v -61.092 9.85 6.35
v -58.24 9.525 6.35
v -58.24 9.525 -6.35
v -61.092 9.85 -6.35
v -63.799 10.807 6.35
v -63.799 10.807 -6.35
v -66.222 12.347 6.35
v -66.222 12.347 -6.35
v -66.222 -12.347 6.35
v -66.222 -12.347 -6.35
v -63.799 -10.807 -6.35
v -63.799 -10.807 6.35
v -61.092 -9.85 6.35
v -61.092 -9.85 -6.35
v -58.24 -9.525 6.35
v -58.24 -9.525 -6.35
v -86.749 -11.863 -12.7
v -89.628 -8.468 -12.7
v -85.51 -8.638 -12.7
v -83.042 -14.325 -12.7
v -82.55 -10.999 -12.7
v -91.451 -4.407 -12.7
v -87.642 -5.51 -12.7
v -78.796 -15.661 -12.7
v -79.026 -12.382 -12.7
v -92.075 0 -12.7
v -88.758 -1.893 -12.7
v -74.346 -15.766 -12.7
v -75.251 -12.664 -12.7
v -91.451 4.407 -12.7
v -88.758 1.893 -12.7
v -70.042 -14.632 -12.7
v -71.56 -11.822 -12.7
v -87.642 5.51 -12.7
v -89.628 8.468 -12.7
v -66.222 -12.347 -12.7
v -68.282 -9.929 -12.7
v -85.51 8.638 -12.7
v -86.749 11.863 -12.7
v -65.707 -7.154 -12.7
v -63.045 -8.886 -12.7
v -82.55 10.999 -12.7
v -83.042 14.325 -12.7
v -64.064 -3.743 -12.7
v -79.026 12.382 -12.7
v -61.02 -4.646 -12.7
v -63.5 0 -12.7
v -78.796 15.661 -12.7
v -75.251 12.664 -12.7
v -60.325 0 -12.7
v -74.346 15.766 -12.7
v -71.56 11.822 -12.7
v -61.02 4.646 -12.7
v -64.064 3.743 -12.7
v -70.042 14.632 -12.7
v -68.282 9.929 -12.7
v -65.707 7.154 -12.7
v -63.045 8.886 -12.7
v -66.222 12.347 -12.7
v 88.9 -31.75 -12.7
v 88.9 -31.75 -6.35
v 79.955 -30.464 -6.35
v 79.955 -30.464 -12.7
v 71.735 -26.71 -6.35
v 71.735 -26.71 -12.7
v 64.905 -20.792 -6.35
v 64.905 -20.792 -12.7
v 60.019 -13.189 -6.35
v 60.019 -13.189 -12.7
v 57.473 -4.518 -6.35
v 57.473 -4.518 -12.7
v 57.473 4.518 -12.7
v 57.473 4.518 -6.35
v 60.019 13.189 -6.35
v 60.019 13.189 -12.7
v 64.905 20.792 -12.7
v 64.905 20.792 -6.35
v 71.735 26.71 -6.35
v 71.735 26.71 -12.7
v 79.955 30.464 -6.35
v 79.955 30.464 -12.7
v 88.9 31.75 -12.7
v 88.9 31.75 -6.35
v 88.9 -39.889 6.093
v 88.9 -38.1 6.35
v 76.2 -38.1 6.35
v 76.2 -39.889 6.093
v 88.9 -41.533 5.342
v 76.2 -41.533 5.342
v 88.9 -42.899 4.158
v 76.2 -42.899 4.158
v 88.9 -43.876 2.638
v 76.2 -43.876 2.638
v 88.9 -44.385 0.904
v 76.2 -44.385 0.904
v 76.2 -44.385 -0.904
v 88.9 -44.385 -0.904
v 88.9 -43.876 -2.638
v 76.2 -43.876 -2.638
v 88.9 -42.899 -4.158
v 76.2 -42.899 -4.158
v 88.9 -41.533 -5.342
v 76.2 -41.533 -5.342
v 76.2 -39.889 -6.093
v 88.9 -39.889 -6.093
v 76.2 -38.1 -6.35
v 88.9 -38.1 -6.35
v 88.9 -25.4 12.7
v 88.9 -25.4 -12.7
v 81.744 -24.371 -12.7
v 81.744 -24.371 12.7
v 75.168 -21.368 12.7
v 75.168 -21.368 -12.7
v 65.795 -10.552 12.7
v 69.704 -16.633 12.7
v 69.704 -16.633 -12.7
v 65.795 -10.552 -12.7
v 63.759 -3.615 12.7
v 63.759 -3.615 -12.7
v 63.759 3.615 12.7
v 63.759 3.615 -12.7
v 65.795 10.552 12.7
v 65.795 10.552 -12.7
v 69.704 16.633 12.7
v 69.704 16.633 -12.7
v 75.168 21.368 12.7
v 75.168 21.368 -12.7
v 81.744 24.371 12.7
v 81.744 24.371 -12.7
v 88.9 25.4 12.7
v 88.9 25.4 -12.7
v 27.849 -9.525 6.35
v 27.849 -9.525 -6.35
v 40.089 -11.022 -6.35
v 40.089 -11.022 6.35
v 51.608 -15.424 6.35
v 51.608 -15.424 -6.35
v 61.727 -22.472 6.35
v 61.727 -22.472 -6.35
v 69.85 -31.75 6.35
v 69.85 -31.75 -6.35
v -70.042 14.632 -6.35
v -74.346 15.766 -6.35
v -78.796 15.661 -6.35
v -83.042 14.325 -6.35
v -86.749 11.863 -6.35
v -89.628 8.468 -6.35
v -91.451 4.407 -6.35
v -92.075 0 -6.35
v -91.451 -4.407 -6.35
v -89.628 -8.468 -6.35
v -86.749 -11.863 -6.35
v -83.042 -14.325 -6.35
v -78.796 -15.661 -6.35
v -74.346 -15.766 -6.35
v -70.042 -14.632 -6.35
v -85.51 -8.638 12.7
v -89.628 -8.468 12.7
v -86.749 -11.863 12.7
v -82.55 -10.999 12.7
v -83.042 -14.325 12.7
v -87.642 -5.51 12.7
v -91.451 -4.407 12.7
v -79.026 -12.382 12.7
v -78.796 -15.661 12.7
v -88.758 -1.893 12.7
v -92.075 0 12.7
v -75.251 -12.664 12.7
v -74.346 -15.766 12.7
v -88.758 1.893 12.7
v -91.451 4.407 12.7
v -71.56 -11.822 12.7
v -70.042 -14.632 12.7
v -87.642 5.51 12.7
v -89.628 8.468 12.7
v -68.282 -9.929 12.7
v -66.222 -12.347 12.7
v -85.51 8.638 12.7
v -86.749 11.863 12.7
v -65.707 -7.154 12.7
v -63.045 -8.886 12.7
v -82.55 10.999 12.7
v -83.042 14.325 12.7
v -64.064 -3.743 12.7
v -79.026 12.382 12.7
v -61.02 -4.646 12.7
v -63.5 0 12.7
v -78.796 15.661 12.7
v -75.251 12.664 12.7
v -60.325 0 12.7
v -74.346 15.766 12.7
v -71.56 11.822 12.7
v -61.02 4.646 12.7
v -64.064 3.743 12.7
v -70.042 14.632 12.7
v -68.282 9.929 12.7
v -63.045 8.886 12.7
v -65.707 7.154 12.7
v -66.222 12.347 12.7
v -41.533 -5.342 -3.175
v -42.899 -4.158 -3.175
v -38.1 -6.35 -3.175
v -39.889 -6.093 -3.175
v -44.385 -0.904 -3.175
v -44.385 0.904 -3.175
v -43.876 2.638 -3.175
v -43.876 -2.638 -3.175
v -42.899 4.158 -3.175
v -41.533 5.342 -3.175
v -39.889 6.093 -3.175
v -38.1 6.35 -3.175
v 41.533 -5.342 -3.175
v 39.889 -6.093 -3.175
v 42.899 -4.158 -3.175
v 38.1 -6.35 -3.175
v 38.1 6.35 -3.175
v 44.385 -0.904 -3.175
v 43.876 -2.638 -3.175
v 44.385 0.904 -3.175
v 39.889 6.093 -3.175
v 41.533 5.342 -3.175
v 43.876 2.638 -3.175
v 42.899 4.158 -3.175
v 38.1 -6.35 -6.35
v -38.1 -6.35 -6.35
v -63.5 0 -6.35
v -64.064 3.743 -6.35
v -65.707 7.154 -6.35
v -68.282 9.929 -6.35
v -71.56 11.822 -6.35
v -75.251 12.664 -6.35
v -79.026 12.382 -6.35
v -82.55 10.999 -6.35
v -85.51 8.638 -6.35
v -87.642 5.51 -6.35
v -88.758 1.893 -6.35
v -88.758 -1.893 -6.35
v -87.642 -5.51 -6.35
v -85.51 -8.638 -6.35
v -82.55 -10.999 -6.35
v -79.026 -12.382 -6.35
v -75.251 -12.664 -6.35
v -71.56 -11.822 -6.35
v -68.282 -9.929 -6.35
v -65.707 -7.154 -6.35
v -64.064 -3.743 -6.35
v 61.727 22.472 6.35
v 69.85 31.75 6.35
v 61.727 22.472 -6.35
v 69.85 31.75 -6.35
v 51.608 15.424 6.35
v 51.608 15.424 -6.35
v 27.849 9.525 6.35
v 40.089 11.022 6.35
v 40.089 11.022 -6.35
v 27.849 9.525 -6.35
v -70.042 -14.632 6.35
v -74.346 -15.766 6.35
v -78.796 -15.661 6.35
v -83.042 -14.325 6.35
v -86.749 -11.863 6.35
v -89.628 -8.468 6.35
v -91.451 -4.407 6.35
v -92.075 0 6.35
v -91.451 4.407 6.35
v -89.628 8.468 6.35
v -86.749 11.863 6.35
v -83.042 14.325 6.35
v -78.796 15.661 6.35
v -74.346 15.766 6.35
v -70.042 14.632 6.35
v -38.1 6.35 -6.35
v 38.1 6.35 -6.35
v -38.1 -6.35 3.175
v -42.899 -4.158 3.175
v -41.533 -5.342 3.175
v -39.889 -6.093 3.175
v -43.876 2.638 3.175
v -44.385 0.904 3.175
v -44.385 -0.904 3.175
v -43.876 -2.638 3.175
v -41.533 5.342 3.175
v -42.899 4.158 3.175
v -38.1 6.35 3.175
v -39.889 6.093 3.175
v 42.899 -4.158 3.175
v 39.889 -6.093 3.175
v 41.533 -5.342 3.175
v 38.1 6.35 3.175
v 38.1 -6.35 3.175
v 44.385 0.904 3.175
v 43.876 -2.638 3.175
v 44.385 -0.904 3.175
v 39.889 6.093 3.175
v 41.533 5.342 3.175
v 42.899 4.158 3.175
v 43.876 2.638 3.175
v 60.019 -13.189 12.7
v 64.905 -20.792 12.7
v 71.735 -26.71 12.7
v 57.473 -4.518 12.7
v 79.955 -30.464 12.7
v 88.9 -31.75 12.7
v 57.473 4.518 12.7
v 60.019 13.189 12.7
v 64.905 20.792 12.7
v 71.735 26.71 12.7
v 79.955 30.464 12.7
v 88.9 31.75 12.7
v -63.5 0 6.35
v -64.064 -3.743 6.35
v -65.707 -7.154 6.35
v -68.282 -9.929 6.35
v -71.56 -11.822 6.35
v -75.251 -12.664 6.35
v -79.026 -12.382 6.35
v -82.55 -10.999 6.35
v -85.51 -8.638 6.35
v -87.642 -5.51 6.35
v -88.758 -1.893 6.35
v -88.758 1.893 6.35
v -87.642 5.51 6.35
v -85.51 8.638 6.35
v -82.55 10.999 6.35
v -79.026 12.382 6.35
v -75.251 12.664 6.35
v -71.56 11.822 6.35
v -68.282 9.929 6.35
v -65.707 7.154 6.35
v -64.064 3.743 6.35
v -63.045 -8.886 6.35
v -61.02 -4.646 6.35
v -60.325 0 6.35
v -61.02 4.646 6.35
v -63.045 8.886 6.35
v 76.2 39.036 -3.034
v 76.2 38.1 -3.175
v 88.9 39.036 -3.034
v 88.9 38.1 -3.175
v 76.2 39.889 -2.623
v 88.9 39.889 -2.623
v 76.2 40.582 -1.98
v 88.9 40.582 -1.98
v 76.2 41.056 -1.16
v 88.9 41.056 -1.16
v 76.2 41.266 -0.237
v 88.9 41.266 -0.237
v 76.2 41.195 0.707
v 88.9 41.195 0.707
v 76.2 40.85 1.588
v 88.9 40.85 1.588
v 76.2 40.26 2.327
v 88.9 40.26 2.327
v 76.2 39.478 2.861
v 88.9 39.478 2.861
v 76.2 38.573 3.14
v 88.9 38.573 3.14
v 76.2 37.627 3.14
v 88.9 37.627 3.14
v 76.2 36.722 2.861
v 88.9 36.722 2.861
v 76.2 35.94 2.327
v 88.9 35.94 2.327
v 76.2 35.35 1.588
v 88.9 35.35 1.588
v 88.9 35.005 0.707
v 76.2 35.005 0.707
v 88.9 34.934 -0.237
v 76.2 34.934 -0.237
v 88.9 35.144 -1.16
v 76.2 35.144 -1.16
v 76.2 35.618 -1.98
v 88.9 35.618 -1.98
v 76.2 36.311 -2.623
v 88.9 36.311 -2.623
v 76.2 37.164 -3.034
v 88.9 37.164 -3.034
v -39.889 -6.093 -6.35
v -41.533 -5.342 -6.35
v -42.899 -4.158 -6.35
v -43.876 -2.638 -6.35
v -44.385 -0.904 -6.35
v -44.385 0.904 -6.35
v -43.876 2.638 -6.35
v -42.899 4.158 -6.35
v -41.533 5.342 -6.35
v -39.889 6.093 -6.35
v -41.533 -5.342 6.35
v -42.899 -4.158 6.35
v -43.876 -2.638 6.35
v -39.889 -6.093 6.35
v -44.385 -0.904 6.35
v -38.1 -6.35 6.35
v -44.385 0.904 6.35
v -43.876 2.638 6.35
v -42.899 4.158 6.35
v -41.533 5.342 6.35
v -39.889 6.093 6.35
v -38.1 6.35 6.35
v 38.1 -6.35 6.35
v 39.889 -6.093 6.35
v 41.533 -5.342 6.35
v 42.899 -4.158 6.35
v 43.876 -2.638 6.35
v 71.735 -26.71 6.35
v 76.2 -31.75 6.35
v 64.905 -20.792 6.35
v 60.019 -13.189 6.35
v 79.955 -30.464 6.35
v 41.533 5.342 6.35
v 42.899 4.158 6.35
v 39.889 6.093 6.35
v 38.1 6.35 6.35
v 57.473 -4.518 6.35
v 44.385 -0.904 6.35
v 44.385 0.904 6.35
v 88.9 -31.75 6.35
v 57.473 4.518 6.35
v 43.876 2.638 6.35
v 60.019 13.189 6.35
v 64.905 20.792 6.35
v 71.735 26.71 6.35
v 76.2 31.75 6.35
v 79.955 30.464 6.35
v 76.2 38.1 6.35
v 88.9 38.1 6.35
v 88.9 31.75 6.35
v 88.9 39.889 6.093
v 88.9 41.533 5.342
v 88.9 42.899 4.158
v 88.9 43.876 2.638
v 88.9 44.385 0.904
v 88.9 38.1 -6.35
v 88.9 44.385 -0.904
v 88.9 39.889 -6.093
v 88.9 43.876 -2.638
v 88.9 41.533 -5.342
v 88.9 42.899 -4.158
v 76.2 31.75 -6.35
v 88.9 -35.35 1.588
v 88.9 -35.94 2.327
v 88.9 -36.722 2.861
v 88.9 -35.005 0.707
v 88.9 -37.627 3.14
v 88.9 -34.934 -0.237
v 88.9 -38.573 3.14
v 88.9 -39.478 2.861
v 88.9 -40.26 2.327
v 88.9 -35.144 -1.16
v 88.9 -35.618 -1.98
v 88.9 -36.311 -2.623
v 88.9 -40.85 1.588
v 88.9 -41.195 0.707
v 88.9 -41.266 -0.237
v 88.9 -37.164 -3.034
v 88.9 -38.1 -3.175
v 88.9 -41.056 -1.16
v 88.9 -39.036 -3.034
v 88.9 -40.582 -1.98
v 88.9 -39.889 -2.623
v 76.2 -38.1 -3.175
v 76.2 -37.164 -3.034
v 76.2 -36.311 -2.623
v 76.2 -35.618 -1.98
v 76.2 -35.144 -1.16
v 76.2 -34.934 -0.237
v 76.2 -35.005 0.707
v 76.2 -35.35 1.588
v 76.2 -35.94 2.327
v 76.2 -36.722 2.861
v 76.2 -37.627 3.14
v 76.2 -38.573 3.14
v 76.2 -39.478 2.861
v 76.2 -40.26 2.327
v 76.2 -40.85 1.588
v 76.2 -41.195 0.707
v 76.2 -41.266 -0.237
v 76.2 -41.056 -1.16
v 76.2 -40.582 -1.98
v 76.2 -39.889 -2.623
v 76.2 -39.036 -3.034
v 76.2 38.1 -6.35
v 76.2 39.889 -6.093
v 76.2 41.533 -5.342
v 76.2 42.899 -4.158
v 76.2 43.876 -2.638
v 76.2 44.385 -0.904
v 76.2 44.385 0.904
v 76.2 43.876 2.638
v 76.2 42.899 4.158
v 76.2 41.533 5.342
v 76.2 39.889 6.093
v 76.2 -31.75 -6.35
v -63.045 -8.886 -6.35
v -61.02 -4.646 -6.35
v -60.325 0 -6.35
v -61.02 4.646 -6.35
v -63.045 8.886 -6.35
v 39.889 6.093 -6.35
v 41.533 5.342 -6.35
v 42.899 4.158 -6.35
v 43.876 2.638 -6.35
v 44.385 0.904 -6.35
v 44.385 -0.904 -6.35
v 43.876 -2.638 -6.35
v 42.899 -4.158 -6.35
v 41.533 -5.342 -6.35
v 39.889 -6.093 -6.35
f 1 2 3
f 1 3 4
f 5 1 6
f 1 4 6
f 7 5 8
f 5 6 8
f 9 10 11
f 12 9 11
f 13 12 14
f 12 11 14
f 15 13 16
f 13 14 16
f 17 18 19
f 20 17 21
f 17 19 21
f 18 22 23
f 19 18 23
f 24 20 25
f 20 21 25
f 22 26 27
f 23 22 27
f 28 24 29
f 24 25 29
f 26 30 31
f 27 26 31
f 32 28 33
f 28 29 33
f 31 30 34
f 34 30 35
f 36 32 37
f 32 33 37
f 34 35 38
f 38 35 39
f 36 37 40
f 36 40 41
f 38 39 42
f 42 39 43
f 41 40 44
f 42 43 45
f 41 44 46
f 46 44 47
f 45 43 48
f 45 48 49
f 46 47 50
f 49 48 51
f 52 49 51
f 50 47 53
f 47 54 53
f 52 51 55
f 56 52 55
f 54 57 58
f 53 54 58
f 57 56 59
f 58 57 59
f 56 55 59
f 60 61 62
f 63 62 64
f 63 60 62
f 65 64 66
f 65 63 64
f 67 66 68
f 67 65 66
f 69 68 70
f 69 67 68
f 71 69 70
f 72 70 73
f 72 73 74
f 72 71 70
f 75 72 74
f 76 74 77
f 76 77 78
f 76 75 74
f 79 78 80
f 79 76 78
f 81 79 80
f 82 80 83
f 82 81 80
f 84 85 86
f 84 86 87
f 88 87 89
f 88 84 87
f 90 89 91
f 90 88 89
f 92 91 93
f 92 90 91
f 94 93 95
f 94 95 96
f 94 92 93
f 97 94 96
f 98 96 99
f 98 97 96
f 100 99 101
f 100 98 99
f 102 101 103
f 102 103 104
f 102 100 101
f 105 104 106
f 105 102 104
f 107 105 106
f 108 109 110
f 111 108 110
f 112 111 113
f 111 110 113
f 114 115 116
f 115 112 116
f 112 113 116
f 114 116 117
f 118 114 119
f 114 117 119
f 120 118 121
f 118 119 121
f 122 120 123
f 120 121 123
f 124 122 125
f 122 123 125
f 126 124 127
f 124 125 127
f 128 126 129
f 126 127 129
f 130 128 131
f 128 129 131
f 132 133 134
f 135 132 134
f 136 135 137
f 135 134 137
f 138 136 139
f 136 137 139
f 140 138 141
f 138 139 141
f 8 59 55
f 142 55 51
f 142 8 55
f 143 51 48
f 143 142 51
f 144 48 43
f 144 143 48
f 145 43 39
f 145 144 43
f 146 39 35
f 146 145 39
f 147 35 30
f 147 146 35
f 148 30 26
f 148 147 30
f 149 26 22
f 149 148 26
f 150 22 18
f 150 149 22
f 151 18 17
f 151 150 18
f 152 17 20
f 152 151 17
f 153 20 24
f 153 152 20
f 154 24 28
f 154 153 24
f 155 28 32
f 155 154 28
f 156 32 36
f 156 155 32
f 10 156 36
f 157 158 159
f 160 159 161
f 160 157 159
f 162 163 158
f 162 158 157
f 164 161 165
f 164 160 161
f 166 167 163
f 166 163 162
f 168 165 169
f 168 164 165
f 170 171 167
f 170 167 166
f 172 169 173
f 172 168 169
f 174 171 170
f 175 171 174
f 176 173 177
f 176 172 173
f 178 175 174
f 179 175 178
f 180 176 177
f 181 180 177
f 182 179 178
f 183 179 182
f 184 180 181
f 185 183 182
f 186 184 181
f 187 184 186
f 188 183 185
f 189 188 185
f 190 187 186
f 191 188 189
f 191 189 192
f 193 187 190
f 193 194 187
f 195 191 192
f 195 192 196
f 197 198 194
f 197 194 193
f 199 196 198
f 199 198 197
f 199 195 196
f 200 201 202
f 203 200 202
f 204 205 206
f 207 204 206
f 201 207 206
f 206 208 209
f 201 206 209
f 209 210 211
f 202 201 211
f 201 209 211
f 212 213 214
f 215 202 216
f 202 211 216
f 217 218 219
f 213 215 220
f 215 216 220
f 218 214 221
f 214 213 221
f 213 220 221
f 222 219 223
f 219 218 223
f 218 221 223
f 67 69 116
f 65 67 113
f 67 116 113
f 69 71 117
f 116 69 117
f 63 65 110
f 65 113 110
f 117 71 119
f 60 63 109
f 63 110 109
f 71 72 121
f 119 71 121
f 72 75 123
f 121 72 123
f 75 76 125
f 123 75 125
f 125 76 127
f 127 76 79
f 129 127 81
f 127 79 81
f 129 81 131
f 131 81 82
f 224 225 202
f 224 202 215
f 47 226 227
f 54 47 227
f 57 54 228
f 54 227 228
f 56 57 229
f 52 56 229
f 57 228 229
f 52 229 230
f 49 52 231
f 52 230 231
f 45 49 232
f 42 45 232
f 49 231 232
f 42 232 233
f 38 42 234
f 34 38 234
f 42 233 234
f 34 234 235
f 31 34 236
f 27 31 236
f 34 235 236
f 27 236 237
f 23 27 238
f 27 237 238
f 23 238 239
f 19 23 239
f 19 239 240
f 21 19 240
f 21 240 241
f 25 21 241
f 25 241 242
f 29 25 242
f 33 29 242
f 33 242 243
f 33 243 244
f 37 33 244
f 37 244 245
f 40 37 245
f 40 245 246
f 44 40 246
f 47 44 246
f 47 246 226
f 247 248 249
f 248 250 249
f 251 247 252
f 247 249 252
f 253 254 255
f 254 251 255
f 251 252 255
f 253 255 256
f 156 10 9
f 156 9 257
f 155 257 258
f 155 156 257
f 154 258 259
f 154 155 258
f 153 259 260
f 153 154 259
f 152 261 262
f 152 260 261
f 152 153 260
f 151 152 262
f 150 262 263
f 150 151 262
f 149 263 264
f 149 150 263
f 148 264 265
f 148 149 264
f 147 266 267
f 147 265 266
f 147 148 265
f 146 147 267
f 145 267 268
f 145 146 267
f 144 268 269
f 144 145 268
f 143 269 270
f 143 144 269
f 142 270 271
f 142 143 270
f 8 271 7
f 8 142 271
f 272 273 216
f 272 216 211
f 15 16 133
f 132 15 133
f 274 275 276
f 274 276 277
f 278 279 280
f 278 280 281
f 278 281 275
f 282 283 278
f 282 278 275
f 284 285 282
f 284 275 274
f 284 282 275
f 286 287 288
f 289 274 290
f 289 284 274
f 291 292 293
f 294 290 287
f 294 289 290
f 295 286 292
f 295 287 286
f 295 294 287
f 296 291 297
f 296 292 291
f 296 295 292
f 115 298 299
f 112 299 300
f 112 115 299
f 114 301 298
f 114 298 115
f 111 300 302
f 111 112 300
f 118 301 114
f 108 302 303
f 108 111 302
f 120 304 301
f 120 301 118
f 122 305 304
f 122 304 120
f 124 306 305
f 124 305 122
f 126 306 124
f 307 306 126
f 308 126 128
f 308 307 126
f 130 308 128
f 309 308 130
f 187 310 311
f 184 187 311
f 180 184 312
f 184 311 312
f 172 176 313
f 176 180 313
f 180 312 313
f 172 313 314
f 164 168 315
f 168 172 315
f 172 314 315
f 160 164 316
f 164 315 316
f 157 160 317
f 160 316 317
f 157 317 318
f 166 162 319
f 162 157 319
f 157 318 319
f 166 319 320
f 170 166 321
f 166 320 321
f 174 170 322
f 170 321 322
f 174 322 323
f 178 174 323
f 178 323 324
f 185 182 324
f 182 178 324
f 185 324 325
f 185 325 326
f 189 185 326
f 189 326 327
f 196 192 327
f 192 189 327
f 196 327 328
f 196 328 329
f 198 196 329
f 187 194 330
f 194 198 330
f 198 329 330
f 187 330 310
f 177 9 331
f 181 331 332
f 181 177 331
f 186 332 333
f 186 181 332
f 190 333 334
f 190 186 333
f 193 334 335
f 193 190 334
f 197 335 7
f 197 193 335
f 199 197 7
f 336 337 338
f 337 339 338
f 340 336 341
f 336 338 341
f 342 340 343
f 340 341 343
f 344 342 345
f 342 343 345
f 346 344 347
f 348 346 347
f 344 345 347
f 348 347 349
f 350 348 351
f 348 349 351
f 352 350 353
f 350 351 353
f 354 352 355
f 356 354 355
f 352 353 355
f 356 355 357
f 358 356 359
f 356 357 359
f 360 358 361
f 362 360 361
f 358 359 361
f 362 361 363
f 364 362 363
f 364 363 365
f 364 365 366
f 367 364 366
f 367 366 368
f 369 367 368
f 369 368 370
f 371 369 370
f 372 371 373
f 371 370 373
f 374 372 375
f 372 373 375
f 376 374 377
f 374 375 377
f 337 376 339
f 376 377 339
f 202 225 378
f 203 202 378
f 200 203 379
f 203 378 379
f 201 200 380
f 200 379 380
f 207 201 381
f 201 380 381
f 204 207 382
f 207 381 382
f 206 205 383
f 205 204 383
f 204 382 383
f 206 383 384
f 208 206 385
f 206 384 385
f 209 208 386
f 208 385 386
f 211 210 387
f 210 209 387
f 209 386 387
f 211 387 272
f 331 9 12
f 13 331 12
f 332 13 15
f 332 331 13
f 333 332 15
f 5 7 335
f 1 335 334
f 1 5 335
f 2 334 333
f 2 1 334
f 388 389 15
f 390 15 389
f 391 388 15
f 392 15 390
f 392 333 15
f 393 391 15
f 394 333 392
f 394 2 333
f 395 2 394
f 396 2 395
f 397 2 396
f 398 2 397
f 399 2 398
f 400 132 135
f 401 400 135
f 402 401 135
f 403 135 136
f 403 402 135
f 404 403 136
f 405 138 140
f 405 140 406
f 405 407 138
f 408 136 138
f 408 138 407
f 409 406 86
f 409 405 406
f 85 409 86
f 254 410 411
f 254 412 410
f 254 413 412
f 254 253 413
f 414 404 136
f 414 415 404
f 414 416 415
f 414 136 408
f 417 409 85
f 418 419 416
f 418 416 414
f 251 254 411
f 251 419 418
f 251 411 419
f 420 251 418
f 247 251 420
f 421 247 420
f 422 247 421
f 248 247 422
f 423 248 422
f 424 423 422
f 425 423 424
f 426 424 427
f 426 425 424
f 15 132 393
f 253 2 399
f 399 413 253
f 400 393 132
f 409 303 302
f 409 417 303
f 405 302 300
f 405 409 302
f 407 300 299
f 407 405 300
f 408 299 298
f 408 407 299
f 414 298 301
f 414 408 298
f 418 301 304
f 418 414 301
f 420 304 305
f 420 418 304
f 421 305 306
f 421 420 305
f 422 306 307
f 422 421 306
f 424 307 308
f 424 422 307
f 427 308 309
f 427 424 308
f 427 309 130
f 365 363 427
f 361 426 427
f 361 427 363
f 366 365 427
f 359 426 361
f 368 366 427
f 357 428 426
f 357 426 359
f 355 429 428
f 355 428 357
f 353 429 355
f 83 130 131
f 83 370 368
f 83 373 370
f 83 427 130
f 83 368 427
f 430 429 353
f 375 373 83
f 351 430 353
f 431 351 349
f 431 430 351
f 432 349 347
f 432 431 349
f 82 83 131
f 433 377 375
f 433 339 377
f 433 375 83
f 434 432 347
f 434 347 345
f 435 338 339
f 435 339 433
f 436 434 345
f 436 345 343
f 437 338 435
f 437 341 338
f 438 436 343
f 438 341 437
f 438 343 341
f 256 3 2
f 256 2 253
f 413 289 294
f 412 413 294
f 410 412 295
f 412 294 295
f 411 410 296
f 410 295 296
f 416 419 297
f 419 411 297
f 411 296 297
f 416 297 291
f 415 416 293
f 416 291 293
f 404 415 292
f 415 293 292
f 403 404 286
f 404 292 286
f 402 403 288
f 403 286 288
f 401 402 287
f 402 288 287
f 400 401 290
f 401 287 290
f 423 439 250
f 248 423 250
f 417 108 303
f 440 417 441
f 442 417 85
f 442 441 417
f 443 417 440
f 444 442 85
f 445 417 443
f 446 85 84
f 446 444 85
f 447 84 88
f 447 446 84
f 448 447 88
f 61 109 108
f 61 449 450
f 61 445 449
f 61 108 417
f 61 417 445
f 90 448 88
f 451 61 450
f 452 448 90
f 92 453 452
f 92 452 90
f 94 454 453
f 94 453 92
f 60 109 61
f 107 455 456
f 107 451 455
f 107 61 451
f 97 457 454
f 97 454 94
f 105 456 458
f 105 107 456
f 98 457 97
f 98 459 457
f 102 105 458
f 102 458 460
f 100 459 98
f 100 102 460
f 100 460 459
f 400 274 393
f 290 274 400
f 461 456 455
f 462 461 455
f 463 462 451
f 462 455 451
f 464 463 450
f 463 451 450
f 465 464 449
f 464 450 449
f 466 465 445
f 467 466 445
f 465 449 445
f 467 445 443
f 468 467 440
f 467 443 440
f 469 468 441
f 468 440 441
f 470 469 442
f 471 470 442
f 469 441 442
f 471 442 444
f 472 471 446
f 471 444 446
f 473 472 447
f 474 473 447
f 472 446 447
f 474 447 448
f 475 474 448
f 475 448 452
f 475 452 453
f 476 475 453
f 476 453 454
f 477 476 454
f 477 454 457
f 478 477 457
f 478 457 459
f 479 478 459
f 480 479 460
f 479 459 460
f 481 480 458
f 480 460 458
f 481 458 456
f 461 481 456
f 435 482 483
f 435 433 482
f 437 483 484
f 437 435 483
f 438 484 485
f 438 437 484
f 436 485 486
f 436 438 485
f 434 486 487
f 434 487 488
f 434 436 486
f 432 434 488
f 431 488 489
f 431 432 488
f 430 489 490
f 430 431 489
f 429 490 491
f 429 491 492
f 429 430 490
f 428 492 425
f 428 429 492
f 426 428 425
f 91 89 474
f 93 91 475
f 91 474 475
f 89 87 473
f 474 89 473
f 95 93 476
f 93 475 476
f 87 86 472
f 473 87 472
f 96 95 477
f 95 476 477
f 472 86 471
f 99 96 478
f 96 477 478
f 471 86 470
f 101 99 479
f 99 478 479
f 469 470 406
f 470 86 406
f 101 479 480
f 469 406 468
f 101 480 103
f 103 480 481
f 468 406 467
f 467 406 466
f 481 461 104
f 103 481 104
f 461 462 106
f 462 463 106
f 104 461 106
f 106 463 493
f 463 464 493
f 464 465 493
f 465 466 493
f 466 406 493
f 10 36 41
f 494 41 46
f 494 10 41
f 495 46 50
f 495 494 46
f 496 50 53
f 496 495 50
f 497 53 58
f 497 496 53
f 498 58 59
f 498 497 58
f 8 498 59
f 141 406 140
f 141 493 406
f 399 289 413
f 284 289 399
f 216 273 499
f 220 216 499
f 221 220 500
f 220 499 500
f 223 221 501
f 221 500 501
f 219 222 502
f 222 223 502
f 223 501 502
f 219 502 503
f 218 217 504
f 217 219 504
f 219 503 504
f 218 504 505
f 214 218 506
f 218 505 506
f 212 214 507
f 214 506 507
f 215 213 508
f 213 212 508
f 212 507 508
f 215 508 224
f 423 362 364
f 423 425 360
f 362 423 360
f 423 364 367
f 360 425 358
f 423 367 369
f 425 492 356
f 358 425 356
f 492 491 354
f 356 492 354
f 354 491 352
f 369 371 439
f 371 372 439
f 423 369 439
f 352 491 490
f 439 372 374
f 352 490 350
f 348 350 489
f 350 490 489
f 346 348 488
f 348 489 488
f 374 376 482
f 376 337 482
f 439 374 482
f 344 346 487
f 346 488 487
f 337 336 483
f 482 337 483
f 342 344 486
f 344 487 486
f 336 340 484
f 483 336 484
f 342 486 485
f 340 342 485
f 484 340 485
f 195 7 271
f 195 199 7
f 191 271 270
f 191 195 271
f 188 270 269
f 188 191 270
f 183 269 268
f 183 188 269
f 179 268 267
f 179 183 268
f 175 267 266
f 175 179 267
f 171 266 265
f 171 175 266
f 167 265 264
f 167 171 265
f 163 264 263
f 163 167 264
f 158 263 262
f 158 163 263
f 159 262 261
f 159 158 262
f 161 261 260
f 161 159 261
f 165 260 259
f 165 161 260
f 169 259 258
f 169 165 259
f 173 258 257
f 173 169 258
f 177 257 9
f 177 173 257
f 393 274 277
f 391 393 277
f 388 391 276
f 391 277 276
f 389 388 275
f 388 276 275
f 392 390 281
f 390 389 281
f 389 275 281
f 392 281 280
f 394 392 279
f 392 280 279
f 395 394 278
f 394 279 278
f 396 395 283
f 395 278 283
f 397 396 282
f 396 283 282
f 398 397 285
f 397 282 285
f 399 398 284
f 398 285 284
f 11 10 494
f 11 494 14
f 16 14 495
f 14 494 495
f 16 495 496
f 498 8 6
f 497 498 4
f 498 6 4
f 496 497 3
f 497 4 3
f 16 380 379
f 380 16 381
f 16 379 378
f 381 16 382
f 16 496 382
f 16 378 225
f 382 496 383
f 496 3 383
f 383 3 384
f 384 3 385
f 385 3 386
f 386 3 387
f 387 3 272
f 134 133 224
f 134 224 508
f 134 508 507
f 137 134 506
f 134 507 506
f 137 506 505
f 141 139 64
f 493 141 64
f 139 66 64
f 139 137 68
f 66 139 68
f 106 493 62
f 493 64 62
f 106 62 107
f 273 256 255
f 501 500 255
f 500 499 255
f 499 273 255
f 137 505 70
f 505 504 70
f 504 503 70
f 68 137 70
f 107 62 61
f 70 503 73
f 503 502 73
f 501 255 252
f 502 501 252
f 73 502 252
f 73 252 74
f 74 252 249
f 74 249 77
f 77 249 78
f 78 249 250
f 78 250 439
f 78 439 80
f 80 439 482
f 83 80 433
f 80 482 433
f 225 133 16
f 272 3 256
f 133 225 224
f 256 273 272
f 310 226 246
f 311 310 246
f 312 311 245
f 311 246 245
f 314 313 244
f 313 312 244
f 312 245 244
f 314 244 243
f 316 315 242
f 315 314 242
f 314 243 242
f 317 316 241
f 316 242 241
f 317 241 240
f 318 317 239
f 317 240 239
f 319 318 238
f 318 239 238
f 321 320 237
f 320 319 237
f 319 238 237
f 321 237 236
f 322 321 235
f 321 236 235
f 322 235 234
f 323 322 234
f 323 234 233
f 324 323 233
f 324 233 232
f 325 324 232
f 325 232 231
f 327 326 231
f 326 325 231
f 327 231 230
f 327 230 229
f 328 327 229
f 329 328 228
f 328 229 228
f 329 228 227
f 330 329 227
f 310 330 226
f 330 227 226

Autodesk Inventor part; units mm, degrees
sketch "Sketch1" plane through (0, 0, 0) normal (0, 0, 1) x (1, 0, 0)
  circle A0 centre (-76.2, 0) radius 15.875
  line L0 (-38.1, 0) -> (38.1, 0) construction
  line L1 (-38.1, -6.35) -> (38.1, -6.35)
  line L2 (38.1, 6.35) -> (-38.1, 6.35)
  arc A1 (-38.1, 6.35) -> (-38.1, -6.35) centre (-38.1, 0) ccw
  arc A2 (38.1, -6.35) -> (38.1, 6.35) centre (38.1, 0) ccw
  arc A3 (88.9, 31.75) -> (88.9, -31.75) centre (88.9, 0) ccw
  circle A4 centre (-76.2, 0) radius 12.7
  arc A5 (88.9, 25.4) -> (88.9, -25.4) centre (88.9, 0) ccw
  line L3 (88.9, 31.75) -> (88.9, 25.4)
  line L4 (88.9, -25.4) -> (88.9, -31.75)
  line L5 (88.9, 31.75) -> (69.85, 31.75)
  line L6 (88.9, -31.75) -> (69.85, -31.75)
  line L7 (-58.2395, 9.525) -> (27.8487, 9.525)
  line L8 (-58.2395, -9.525) -> (27.8487, -9.525)
  arc A6 (27.8487, 9.525) -> (69.85, 31.75) centre (27.8487, 60.325) ccw
  arc A7 (69.85, -31.75) -> (27.8487, -9.525) centre (27.8487, -60.325) ccw
  arc A8 (-66.2219, 12.3472) -> (-58.2395, 9.525) centre (-58.2395, 22.225) ccw
  arc A9 (-58.2395, -9.525) -> (-66.2219, -12.3472) centre (-58.2395, -22.225) ccw
  point P0 (0, 0)
  point P1 (0, 0)
  dimension "d0" = 31.75
  dimension "d1" = 25.4
  dimension "d2" = 12.7
  dimension "d3" = 76.2
  dimension "d4" = 165.1
  dimension "d5" = 50.8
  dimension "d6" = 63.5
  dimension "d7" = 50.8
  dimension "d8" = 19.05
  dimension "d9" = 19.05
  dimension "d12" = 19.05
  dimension "d13" = 9.525
  dimension "d15" = 101.6
  dimension "d16" = 101.6
  dimension "d18" = 25.4
  dimension "d19" = 0
  dimension "d39" = 31.75
  dimension "d41" = 25.4
extrude "Base" add sketch "Sketch1" along normal mid plane 12.7
extrude "Indent" add sketch "Sketch1" along normal mid plane 6.35 contours A1 L2 A2 L1
extrude "Extrusion4" add sketch "Sketch1" along normal mid plane 25.4 contours L3 A5 L4 A3
sketch "Sketch3" plane through (88.9, 25.4, 12.7) normal (1, 0, 0) x (0, 0, -1)
  line L0 (6.35, 6.35) -> (19.05, 6.35)
  line L1 (19.05, 6.35) -> (19.05, 12.7)
  line L2 (6.35, 12.7) -> (6.35, 6.35)
  line L3 (6.35, 6.35) -> (19.05, 6.35) projected
  line L4 (0, 0) -> (0, 6.35) projected
  line L5 (25.4, 0) -> (0, 0) projected
  line L6 (25.4, 6.35) -> (25.4, 0) projected
  arc A0 (19.05, 12.7) -> (6.35, 12.7) centre (12.7, 12.7) ccw
  circle A1 centre (12.7, 12.7) radius 3.175
  line L7 (-5.08, -25.4) -> (30.48, -25.4) projected
  line L8 (6.35, -57.15) -> (19.05, -57.15)
  line L9 (19.05, -57.15) -> (19.05, -63.5)
  line L10 (6.35, -63.5) -> (6.35, -57.15)
  line L11 (6.35, -57.15) -> (19.05, -57.15)
  line L12 (6.35, -57.15) -> (19.05, -57.15)
  arc A2 (6.35, -63.5) -> (19.05, -63.5) centre (12.7, -63.5) ccw
  circle A3 centre (12.7, -63.5) radius 3.175
  line L13 (6.35, 6.35) -> (19.05, 6.35) projected
  line L14 (19.05, 6.35) -> (25.4, 6.35) projected
  line L15 (0, 6.35) -> (6.35, 6.35) projected
  point P0 (12.7, -25.4)
  dimension "d28" = 0
  dimension "d30" = 12.7
  dimension "d31" = 6.35
  dimension "d32" = 6.35
  dimension "d42" = 6.35
  dimension "d43" = 76.2
  dimension "d44" = 6.35
extrude "Extrusion5" add sketch "Sketch3" against normal blind 12.7 contours L2 A0 L1 L0 | L8 L9 A2 L10
sketch "Sketch4" plane through (0, 0, 6.35) normal (0, 0, 1) x (1, 0, 0)
  arc A0 (-66.2219, 12.3472) -> (-66.2219, -12.3472) centre (-76.2, 0) ccw projected
  circle A1 centre (-76.2, 0) radius 12.7 projected
  circle A2 centre (-76.2, 0) radius 12.7
  circle A3 centre (-76.2, 0) radius 15.875
  arc A4 (88.9, 31.75) -> (88.9, -31.75) centre (88.9, 0) ccw projected
  line L0 (88.9, 38.1) -> (88.9, 31.75) projected
  line L1 (88.9, 38.1) -> (76.2, 38.1) projected
  line L2 (76.2, 31.75) -> (76.2, 38.1) projected
  line L3 (76.2, 31.75) -> (69.85, 31.75) projected
  arc A5 (27.8487, 9.525) -> (69.85, 31.75) centre (27.8487, 60.325) ccw projected
  line L4 (27.8487, 9.525) -> (-58.2395, 9.525) projected
  arc A6 (-66.2219, 12.3472) -> (-58.2395, 9.525) centre (-58.2395, 22.225) ccw projected
  arc A7 (-58.2395, -9.525) -> (-66.2219, -12.3472) centre (-58.2395, -22.225) ccw projected
  line L5 (-58.2395, -9.525) -> (27.8487, -9.525) projected
  arc A8 (69.85, -31.75) -> (27.8487, -9.525) centre (27.8487, -60.325) ccw projected
  line L6 (69.85, -31.75) -> (76.2, -31.75) projected
  line L7 (76.2, -38.1) -> (76.2, -31.75) projected
  line L8 (88.9, -38.1) -> (76.2, -38.1) projected
  line L9 (88.9, -31.75) -> (88.9, -38.1) projected
  point P0 (0, 0)
extrude "Extrusion6" add sketch "Sketch4" against normal blind 19.05 and the other way blind 6.35 contours A3 A0
properties part number "7.3_Connecting_Rod"
